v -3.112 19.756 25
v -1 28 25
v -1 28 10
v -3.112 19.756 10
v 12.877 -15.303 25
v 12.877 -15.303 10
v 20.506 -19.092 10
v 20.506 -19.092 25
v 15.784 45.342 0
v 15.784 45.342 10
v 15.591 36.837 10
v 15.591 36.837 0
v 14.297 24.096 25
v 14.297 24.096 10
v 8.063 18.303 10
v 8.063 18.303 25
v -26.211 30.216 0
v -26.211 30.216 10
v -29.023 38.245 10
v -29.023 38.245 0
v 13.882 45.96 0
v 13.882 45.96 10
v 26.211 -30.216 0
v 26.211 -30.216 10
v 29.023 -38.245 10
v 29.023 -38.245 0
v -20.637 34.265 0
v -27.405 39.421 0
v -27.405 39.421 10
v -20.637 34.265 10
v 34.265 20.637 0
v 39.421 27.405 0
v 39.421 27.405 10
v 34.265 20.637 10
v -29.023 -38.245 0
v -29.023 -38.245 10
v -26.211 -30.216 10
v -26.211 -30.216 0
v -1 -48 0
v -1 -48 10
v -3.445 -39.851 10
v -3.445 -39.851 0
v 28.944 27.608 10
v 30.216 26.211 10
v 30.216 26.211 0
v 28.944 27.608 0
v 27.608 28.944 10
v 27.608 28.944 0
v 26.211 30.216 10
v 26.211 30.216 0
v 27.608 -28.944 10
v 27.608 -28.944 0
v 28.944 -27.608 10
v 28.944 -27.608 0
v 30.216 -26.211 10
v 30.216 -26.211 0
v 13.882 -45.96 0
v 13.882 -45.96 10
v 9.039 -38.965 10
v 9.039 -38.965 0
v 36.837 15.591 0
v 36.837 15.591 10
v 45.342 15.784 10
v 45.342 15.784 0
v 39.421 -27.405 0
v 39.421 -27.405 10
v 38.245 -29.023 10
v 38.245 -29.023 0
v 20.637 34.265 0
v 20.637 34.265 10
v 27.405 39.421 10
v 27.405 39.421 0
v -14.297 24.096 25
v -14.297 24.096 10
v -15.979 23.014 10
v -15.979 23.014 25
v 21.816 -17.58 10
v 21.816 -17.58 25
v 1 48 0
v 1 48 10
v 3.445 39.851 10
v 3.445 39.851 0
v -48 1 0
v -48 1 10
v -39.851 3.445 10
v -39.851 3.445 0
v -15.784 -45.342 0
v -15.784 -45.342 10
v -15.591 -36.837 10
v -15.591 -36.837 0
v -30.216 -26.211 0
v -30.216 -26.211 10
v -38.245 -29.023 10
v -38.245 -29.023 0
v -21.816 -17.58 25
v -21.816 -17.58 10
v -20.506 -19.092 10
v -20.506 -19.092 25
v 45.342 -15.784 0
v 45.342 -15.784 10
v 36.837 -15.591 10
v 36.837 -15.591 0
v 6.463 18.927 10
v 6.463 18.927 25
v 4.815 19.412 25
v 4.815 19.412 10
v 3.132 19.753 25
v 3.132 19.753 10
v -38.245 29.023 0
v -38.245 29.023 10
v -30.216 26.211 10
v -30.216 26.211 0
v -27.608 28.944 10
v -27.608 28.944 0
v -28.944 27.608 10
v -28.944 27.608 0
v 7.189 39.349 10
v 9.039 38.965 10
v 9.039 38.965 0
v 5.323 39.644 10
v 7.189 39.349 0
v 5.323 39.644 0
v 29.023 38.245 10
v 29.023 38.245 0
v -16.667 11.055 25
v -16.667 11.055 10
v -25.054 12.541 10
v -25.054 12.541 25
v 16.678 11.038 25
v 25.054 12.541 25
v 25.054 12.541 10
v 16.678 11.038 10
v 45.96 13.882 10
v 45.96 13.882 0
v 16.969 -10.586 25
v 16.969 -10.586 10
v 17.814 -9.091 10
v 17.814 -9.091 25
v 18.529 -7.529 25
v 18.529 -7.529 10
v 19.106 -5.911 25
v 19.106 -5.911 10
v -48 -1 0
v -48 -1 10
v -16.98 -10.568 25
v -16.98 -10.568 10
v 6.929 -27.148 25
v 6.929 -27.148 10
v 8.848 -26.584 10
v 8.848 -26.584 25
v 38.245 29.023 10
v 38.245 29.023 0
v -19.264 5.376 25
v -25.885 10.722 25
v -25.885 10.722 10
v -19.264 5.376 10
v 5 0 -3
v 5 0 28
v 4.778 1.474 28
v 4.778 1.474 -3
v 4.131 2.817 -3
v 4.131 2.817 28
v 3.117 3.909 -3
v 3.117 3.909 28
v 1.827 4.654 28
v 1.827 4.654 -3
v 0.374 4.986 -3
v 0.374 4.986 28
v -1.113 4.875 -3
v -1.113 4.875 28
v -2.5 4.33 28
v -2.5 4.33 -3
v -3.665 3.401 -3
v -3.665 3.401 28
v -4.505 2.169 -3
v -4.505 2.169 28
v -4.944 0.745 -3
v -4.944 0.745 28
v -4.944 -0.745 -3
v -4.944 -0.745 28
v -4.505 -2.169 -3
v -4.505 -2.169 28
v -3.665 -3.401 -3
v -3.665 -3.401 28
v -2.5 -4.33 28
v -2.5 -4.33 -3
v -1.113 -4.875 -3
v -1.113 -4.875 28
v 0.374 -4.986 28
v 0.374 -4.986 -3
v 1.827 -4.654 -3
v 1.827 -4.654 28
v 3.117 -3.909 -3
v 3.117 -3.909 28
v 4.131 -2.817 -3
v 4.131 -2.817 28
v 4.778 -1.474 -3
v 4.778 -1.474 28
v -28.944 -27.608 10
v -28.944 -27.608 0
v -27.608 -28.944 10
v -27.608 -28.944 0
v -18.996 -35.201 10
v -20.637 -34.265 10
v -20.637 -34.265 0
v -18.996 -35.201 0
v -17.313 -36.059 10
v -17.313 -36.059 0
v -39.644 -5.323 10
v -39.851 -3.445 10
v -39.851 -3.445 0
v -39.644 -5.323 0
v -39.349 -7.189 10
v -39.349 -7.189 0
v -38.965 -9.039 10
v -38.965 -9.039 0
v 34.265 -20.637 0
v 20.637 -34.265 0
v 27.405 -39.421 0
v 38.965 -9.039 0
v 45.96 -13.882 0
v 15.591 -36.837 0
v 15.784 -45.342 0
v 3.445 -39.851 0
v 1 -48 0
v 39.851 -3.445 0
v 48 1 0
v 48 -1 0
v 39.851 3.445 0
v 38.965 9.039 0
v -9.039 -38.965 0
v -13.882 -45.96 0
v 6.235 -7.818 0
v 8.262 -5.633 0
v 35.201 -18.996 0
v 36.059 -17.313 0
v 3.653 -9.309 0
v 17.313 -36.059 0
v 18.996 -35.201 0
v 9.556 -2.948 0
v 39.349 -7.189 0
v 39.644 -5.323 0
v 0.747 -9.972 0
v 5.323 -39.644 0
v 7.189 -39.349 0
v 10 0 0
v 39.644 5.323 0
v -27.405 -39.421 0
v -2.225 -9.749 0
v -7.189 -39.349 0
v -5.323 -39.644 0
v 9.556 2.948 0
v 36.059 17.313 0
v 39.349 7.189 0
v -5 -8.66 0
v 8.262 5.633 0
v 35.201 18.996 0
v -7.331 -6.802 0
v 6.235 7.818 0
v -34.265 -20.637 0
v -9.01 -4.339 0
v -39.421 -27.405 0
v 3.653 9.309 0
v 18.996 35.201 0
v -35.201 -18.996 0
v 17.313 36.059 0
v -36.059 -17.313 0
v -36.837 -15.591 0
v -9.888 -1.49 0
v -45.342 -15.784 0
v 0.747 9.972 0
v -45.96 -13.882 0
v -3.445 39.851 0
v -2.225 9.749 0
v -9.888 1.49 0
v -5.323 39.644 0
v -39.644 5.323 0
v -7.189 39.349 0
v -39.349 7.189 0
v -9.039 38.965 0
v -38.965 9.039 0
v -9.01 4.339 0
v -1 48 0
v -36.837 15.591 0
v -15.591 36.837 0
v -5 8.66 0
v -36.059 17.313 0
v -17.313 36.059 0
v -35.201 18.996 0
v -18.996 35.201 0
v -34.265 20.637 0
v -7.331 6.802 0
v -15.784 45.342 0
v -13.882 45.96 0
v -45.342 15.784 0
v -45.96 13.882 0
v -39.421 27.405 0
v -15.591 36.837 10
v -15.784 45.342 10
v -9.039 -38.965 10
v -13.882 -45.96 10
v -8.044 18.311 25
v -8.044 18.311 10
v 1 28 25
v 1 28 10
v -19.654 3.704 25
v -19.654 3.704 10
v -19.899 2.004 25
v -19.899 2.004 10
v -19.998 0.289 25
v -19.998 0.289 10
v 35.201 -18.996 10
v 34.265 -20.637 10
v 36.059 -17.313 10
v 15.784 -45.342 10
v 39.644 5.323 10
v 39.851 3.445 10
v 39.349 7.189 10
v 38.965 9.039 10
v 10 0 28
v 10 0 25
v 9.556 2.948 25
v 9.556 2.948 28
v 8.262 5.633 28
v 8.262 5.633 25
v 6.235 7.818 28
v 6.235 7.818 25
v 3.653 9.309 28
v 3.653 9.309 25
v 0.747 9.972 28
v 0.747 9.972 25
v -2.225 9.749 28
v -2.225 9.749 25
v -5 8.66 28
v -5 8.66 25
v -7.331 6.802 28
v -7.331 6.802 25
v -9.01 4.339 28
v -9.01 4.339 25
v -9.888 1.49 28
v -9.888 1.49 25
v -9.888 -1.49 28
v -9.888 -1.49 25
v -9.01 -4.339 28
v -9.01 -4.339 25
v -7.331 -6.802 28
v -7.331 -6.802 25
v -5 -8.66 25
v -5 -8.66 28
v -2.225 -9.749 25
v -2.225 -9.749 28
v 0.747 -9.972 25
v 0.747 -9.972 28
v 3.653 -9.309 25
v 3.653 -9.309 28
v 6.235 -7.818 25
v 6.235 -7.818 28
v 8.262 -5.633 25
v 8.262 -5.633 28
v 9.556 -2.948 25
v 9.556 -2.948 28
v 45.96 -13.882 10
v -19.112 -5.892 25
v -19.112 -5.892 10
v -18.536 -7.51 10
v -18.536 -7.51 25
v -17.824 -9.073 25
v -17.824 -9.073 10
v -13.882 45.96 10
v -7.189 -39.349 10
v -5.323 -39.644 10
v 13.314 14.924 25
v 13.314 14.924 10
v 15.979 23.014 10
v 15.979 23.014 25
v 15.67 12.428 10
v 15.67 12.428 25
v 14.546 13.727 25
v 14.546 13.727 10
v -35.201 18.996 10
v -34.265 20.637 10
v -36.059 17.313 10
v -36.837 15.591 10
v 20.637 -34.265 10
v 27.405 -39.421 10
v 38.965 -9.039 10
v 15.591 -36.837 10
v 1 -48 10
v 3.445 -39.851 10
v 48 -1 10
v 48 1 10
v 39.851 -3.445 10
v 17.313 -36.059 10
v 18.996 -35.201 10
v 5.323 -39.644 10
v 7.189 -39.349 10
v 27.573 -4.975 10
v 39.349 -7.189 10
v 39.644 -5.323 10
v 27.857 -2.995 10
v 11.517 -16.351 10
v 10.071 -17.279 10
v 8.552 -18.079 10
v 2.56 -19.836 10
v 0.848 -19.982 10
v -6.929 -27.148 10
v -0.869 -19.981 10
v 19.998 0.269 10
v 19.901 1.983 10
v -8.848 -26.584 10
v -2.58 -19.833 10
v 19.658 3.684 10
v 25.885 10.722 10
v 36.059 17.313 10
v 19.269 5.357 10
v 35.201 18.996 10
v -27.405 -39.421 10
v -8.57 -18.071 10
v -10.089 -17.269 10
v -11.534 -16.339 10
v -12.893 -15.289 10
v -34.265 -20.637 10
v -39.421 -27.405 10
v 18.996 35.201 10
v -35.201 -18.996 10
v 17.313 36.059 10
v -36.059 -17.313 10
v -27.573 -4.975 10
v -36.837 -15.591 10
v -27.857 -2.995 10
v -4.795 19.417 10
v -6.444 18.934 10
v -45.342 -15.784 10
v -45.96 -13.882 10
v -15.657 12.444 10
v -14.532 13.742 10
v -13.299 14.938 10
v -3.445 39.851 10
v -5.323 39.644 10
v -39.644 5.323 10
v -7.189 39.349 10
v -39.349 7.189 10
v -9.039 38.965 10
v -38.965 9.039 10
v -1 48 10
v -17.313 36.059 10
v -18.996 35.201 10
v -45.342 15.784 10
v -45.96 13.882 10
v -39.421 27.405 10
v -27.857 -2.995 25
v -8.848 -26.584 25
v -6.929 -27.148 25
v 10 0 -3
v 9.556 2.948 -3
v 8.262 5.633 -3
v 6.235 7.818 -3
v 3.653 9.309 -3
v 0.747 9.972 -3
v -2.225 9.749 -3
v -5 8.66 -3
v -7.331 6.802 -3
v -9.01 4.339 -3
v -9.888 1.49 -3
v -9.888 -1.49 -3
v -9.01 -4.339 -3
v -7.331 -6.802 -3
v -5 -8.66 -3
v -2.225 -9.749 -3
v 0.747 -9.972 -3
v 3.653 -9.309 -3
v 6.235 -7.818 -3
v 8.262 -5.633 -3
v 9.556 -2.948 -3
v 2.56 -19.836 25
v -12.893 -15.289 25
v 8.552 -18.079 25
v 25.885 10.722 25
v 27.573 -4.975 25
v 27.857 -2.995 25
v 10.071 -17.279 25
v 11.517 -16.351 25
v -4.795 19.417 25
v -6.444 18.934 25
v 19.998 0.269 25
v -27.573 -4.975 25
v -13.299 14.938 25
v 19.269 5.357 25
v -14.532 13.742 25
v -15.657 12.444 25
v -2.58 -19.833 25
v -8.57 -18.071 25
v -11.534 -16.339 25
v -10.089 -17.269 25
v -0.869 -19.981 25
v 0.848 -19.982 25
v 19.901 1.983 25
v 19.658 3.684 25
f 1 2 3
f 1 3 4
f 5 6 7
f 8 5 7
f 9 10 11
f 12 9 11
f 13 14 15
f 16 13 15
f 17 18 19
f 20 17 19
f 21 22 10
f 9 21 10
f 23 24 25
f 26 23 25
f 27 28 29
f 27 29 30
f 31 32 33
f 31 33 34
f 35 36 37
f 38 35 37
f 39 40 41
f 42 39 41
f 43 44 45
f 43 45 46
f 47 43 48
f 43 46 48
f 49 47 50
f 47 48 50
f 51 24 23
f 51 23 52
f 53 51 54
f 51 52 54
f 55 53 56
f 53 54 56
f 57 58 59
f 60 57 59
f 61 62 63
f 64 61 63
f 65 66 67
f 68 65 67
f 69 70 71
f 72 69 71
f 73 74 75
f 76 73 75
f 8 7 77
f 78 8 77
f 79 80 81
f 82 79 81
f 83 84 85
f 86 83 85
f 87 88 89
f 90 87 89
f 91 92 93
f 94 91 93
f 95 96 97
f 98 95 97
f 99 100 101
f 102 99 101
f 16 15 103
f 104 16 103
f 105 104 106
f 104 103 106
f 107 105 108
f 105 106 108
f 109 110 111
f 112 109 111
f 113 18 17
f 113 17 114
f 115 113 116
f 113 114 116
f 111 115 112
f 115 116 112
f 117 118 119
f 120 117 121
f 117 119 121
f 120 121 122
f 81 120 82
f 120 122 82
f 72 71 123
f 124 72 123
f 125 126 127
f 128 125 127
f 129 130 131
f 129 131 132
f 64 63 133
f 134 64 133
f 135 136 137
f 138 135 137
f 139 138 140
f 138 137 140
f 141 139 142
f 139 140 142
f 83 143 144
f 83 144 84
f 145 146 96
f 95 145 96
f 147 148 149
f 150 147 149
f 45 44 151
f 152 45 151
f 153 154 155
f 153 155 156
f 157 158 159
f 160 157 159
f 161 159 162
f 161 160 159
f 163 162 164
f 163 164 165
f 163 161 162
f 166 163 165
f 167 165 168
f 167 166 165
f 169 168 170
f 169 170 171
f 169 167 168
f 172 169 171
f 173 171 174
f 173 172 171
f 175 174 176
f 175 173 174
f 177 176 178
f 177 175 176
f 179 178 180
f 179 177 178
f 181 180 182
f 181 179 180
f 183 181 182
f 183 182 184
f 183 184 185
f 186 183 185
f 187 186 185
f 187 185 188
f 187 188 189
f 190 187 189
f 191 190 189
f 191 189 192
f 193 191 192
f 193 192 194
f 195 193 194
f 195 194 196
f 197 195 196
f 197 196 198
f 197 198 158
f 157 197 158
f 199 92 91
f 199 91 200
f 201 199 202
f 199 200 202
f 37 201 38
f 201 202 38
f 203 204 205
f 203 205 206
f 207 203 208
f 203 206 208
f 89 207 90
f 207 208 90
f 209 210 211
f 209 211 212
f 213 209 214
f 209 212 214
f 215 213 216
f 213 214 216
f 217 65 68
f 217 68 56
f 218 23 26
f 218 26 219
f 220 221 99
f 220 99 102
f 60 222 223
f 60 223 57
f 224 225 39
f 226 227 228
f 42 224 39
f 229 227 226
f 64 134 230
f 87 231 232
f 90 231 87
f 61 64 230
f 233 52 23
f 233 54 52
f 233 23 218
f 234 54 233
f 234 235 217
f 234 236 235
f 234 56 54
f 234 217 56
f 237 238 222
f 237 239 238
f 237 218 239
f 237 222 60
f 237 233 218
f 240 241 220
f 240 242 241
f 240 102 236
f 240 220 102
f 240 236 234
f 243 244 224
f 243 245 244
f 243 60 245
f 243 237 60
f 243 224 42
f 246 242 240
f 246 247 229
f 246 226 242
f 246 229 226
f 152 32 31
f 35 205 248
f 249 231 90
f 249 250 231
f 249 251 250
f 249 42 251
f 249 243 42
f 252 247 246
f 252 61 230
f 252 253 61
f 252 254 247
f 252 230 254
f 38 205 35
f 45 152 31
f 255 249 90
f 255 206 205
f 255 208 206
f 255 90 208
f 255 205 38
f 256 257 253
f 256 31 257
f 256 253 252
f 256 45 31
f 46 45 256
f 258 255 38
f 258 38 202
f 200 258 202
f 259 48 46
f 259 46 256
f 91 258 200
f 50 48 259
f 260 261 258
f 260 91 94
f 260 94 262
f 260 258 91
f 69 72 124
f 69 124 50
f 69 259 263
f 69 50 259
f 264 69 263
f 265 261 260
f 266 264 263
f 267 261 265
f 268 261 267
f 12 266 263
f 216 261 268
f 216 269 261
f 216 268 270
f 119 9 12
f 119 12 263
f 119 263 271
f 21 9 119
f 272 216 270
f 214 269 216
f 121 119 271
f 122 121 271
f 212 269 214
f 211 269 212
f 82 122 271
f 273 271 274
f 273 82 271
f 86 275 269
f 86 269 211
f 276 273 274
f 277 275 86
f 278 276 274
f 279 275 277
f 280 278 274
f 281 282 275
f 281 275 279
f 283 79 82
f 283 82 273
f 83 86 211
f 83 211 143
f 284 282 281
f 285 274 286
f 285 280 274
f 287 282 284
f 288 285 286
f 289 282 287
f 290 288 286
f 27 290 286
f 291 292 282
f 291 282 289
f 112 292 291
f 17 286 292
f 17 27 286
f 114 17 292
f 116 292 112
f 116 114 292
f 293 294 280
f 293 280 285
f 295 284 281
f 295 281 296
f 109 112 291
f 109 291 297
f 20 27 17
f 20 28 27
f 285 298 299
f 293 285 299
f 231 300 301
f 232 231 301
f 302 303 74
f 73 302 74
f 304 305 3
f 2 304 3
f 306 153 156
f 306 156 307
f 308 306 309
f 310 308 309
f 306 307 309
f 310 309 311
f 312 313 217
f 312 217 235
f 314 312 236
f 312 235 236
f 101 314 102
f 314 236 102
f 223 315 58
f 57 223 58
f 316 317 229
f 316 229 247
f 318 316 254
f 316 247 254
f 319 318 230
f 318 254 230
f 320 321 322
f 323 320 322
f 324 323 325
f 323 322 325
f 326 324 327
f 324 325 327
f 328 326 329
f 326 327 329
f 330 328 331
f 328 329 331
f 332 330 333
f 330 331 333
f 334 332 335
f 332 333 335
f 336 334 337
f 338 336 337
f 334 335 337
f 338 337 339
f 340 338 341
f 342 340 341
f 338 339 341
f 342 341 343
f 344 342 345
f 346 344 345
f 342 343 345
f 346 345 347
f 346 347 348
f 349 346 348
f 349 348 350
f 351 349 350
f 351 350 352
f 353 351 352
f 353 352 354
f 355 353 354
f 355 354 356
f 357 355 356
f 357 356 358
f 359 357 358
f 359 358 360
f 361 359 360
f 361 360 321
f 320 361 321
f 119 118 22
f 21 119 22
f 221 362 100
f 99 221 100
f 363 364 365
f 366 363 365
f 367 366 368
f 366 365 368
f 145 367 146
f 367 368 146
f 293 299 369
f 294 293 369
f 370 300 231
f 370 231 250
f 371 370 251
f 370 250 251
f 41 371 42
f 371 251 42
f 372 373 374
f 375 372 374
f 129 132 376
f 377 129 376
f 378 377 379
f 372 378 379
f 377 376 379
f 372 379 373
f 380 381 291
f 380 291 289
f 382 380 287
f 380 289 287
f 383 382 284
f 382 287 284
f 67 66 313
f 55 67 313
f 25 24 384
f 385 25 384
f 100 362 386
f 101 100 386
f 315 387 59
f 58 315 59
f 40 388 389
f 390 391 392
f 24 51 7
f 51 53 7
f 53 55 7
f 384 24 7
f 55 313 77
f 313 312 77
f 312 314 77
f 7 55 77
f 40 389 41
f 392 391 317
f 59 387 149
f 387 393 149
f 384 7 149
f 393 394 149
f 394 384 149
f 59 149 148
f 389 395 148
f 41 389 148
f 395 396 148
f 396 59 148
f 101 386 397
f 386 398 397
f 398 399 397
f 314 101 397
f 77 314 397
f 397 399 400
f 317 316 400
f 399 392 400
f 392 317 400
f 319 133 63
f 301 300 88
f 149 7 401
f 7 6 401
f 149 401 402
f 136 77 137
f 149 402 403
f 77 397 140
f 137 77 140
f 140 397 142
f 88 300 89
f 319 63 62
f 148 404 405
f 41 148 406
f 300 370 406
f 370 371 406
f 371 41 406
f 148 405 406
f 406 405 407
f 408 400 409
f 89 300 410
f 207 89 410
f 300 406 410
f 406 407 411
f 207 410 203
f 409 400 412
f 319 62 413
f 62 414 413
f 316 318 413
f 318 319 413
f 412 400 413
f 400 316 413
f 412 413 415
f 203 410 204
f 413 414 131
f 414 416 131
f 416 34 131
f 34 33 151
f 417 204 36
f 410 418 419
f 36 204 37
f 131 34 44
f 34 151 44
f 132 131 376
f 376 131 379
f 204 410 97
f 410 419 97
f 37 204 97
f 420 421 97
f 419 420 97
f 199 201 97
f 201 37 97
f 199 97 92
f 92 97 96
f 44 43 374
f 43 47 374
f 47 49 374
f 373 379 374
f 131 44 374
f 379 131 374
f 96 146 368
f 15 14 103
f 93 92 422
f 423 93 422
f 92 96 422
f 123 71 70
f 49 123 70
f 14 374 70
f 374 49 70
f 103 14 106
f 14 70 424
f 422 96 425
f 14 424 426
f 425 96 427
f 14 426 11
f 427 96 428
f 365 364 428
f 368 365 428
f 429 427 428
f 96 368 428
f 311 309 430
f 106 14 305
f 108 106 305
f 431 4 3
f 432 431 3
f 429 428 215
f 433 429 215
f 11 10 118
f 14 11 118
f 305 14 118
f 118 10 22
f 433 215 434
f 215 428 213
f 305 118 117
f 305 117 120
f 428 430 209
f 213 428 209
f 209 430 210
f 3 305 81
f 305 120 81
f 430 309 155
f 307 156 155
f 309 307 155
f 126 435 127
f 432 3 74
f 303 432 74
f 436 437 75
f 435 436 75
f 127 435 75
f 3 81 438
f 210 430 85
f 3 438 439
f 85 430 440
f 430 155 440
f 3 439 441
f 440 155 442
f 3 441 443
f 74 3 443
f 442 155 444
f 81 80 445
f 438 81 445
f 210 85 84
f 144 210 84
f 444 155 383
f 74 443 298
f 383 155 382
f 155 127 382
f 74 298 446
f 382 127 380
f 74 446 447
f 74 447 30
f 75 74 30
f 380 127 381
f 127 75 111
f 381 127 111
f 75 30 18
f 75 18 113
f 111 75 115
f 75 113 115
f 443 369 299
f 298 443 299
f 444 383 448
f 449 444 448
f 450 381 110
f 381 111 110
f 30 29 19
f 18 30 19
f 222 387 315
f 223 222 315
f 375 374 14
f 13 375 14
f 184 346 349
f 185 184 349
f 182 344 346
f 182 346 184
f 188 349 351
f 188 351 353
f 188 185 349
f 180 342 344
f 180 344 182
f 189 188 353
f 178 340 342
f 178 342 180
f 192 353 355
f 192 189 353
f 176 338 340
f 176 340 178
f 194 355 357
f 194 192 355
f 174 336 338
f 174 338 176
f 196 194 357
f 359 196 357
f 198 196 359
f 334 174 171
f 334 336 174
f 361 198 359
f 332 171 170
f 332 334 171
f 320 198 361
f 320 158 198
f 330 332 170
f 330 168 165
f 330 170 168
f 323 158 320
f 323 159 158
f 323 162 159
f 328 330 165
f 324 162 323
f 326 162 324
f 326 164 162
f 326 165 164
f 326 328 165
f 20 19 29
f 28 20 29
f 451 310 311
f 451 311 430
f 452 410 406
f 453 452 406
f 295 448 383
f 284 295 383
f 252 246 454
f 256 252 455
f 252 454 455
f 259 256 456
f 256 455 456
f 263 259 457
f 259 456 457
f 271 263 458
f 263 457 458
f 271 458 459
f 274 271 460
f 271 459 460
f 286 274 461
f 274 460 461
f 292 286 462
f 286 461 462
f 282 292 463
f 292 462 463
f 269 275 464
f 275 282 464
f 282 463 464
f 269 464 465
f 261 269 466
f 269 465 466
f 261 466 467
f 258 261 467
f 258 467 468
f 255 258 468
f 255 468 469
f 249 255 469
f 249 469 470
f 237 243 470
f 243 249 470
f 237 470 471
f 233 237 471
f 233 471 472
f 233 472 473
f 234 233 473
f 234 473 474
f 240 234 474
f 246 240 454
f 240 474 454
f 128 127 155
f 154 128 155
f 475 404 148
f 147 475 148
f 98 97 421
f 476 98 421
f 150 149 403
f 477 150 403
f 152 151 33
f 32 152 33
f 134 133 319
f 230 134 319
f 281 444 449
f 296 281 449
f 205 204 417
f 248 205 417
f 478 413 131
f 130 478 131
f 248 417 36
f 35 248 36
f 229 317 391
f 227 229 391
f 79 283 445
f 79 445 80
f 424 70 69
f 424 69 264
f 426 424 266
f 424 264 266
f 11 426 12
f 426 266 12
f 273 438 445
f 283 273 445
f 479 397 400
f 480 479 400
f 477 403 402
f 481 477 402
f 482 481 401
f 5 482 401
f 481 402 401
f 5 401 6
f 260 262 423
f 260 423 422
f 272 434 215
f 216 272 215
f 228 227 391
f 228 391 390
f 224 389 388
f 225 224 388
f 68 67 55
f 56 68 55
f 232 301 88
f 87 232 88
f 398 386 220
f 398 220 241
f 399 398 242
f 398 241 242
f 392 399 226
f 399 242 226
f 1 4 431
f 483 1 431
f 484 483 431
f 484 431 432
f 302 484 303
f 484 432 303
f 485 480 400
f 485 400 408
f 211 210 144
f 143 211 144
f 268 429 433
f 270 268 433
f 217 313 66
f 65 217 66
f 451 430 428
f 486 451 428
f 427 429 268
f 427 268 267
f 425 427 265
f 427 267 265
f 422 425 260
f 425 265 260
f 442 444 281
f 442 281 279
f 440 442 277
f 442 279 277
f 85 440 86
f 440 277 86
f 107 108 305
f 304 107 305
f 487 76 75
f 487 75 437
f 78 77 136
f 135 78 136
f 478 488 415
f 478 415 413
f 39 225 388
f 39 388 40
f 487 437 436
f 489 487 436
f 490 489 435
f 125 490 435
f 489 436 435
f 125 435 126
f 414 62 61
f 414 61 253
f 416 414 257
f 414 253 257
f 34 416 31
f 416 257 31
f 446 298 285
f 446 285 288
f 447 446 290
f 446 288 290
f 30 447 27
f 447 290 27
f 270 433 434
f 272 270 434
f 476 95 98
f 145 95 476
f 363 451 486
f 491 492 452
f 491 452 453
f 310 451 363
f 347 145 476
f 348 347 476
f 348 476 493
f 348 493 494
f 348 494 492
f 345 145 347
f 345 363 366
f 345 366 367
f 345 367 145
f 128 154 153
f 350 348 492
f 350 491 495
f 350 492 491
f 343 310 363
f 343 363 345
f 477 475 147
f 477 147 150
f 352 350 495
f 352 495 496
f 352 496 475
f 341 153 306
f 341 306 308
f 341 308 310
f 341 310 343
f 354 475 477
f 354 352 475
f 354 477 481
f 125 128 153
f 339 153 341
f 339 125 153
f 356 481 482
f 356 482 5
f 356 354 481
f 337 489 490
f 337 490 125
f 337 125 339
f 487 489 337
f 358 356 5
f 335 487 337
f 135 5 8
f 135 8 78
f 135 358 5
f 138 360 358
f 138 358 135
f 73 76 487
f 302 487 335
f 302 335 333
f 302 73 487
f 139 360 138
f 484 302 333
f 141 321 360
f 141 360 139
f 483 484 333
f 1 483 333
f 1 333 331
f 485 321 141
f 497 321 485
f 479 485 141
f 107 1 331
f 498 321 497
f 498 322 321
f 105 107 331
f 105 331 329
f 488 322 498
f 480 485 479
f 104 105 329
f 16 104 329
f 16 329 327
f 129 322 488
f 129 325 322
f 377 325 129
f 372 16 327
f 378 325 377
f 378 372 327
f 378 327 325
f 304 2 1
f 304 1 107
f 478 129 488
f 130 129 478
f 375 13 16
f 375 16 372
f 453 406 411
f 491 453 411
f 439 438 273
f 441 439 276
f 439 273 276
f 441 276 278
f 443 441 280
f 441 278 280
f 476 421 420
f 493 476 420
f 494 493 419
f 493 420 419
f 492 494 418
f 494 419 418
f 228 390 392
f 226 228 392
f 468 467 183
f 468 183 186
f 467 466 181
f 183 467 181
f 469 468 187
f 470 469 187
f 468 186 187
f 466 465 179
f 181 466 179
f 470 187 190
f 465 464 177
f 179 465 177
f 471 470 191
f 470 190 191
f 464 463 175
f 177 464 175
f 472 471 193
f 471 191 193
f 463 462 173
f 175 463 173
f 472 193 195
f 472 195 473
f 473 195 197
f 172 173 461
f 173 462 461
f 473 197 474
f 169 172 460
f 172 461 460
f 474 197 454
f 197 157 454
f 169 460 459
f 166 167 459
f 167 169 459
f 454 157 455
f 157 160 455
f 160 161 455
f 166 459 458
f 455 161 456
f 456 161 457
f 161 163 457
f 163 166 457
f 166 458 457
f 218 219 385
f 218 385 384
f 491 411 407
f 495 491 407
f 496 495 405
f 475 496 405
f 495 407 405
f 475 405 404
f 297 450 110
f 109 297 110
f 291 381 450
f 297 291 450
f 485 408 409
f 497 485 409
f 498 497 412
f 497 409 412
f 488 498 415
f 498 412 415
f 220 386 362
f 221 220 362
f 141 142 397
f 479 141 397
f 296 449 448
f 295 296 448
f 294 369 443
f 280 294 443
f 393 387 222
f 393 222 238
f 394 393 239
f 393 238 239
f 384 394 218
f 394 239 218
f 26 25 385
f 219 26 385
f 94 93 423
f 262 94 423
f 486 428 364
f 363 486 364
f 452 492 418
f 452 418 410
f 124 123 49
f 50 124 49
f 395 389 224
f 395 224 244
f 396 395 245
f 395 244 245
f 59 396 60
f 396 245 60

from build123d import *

# Parameters (mm, degrees)
SKETCH1_R                = 40
BOSS_EXTRUDE1_DEPTH      = 10
BOSS_EXTRUDE2_DEPTH      = 10
SKETCH3_R                = 20
BOSS_EXTRUDE3_DEPTH      = 15
BOSS_EXTRUDE4_START      = -15
BOSS_EXTRUDE4_DEPTH      = 15
BOSS_EXTRUDE6_DEPTH      = 3
BOSS_EXTRUDE6_DEPTH_BACK = 28
SKETCH5_R                = 10
SKETCH5_R_2              = 5
CUT_EXTRUDE1_DEPTH       = 74.430239003
CUT_EXTRUDE1_DEPTH_BACK  = 74.430239003
SKETCH6_R                = 5


with BuildPart() as part:
    # Sketch1 → Boss-Extrude1 (new body)
    with BuildSketch(Plane.XY):
        Circle(SKETCH1_R)
    extrude(amount=BOSS_EXTRUDE1_DEPTH)

    # Sketch2 → Boss-Extrude2 (add)
    with BuildSketch(Plane.XY.offset(10)):
        Polygon((-1, 48), (1, 48), (4, 38), (-4, 38), align=None)
        Polygon((7.938419721, 37.376215597), (13.881759214, 45.959729777), (15.783872246, 45.341695788), (15.546871851, 34.904079642), align=None)
        Polygon((19.09977161, 33.093786795), (27.404675116, 39.420600982), (29.022709104, 38.245030478), (25.571907565, 28.391504777), align=None)
        Polygon((28.391504777, 25.571907565), (38.245030478, 29.022709104), (39.420600982, 27.404675116), (33.093786795, 19.09977161), align=None)
        Polygon((34.904079642, 15.546871851), (45.341695788, 15.783872246), (45.959729777, 13.881759214), (37.376215597, 7.938419721), align=None)
        Polygon((38, 4), (48, 1), (48, -1), (38, -4), align=None)
        Polygon((37.376215597, -7.938419721), (45.959729777, -13.881759214), (45.341695788, -15.783872246), (34.904079642, -15.546871851), align=None)
        Polygon((33.093786795, -19.09977161), (39.420600982, -27.404675116), (38.245030478, -29.022709104), (28.391504777, -25.571907565), align=None)
        Polygon((25.571907565, -28.391504777), (29.022709104, -38.245030478), (27.404675116, -39.420600982), (19.09977161, -33.093786795), align=None)
        Polygon((15.546871851, -34.904079642), (15.783872246, -45.341695788), (13.881759214, -45.959729777), (7.938419721, -37.376215597), align=None)
        Polygon((4, -38), (1, -48), (-1, -48), (-4, -38), align=None)
        Polygon((-7.938419721, -37.376215597), (-13.881759214, -45.959729777), (-15.783872246, -45.341695788), (-15.546871851, -34.904079642), align=None)
        Polygon((-19.09977161, -33.093786795), (-27.404675116, -39.420600982), (-29.022709104, -38.245030478), (-25.571907565, -28.391504777), align=None)
        Polygon((-28.391504777, -25.571907565), (-38.245030478, -29.022709104), (-39.420600982, -27.404675116), (-33.093786795, -19.09977161), align=None)
        Polygon((-34.904079642, -15.546871851), (-45.341695788, -15.783872246), (-45.959729777, -13.881759214), (-37.376215597, -7.938419721), align=None)
        Polygon((-38, -4), (-48, -1), (-48, 1), (-38, 4), align=None)
        Polygon((-37.376215597, 7.938419721), (-45.959729777, 13.881759214), (-45.341695788, 15.783872246), (-34.904079642, 15.546871851), align=None)
        Polygon((-33.093786795, 19.09977161), (-39.420600982, 27.404675116), (-38.245030478, 29.022709104), (-28.391504777, 25.571907565), align=None)
        Polygon((-25.571907565, 28.391504777), (-29.022709104, 38.245030478), (-27.404675116, 39.420600982), (-19.09977161, 33.093786795), align=None)
        Polygon((-15.546871851, 34.904079642), (-15.783872246, 45.341695788), (-13.881759214, 45.959729777), (-7.938419721, 37.376215597), align=None)
    extrude(amount=-BOSS_EXTRUDE2_DEPTH)

    # Sketch3 → Boss-Extrude3 (add)
    with BuildSketch(Plane.XY.offset(10)):
        Circle(SKETCH3_R)
    extrude(amount=BOSS_EXTRUDE3_DEPTH)

    # Sketch4 → Boss-Extrude4 (add)
    with BuildSketch(Plane.XY.offset(25).offset(BOSS_EXTRUDE4_START)):
        with BuildLine():
            ThreePointArc((-13.298978315, 14.937776802), (-10.804143602, 16.830641136), (-8.044414634, 18.310854518))
            Line((-8.044414634, 18.310854518), (-14.296689356, 24.095739737))
            Line((-14.296689356, 24.095739737), (-15.979196422, 23.014458102))
            Line((-15.979196422, 23.014458102), (-13.298978315, 14.937776802))
        make_face()
        with BuildLine():
            Line((1, 28), (-1, 28))
            Line((-1, 28), (-3.11184063, 19.756428015))
            ThreePointArc((-3.11184063, 19.756428015), (-1.560679292, 19.939014021), (0, 20))
            ThreePointArc((0, 20), (1.570955262, 19.93820703), (3.132203125, 19.753209957))
            Line((3.132203125, 19.753209957), (1, 28))
        make_face()
        with BuildLine():
            Line((14.296689356, 24.095739737), (8.063284469, 18.302552925))
            ThreePointArc((8.063284469, 18.302552925), (10.821486224, 16.819495709), (13.314368522, 14.924060803))
            Line((13.314368522, 14.924060803), (15.979196422, 23.014458102))
            Line((15.979196422, 23.014458102), (14.296689356, 24.095739737))
        make_face()
        with BuildLine():
            Line((25.054280857, 12.541252359), (16.67837372, 11.037746602))
            ThreePointArc((16.67837372, 11.037746602), (18.196919426, 8.298923027), (19.269315989, 5.356627793))
            Line((19.269315989, 5.356627793), (25.885110883, 10.721988369))
            Line((25.885110883, 10.721988369), (25.054280857, 12.541252359))
        make_face()
        with BuildLine():
            Line((27.857315211, -2.99499403), (19.99819716, 0.268533721))
            ThreePointArc((19.99819716, 0.268533721), (19.999549285, 0.134269886), (20, 0))
            ThreePointArc((20, 0), (19.775336098, -2.989328052), (19.10639178, -5.911496693))
            Line((19.10639178, -5.911496693), (27.572685534, -4.974636914))
            Line((27.572685534, -4.974636914), (27.857315211, -2.99499403))
        make_face()
        with BuildLine():
            ThreePointArc((-19.263784352, 5.376486999), (-18.188355556, 8.317675286), (-16.666987586, 11.054932149))
            Line((-16.666987586, 11.054932149), (-25.054280857, 12.541252359))
            Line((-25.054280857, 12.541252359), (-25.885110883, 10.721988369))
            Line((-25.885110883, 10.721988369), (-19.263784352, 5.376486999))
        make_face()
        with BuildLine():
            ThreePointArc((-19.112474968, -5.891799437), (-19.797893134, -2.836093696), (-19.997909742, 0.289146933))
            Line((-19.997909742, 0.289146933), (-27.857315211, -2.99499403))
            Line((-27.857315211, -2.99499403), (-27.572685534, -4.974636914))
            Line((-27.572685534, -4.974636914), (-19.112474968, -5.891799437))
        make_face()
        with BuildLine():
            ThreePointArc((-12.893089824, -15.289481181), (-15.121739527, -13.089422969), (-16.979636854, -10.568440392))
            Line((-16.979636854, -10.568440392), (-21.815848816, -17.580350976))
            Line((-21.815848816, -17.580350976), (-20.506127348, -19.091850125))
            Line((-20.506127348, -19.091850125), (-12.893089824, -15.289481181))
        make_face()
        with BuildLine():
            ThreePointArc((-2.580239759, -19.832860681), (-5.644540466, -19.186952935), (-8.570449237, -18.070622565))
            Line((-8.570449237, -18.070622565), (-8.848004565, -26.584070704))
            Line((-8.848004565, -26.584070704), (-6.929018618, -27.147535818))
            Line((-6.929018618, -27.147535818), (-2.580239759, -19.832860681))
        make_face()
        with BuildLine():
            Line((8.848004565, -26.584070704), (8.551818198, -18.079447047))
            ThreePointArc((8.551818198, -18.079447047), (5.624760311, -19.192760912), (2.559795457, -19.835509754))
            Line((2.559795457, -19.835509754), (6.929018618, -27.147535818))
            Line((6.929018618, -27.147535818), (8.848004565, -26.584070704))
        make_face()
        with BuildLine():
            Line((21.815848816, -17.580350976), (16.968734301, -10.585936718))
            ThreePointArc((16.968734301, -10.585936718), (15.108239432, -13.10500291), (12.87732318, -15.302762748))
            Line((12.87732318, -15.302762748), (20.506127348, -19.091850125))
            Line((20.506127348, -19.091850125), (21.815848816, -17.580350976))
        make_face()
    extrude(amount=BOSS_EXTRUDE4_DEPTH)

    # Sketch5 → Boss-Extrude6 (add, two sides: drawn at the far end of the back side and taken through both)
    with BuildSketch(Plane.XY.offset(25).offset(-BOSS_EXTRUDE6_DEPTH_BACK)):
        Circle(SKETCH5_R)
        Circle(SKETCH5_R_2, mode=Mode.SUBTRACT)
    extrude(amount=BOSS_EXTRUDE6_DEPTH + BOSS_EXTRUDE6_DEPTH_BACK)

    # Sketch6 → Cut-Extrude1 (cut, two sides: drawn at the far end of the back side and taken through both)
    with BuildSketch(Plane.XY.offset(25).offset(-CUT_EXTRUDE1_DEPTH_BACK)):
        Circle(SKETCH6_R)
    extrude(amount=CUT_EXTRUDE1_DEPTH + CUT_EXTRUDE1_DEPTH_BACK, mode=Mode.SUBTRACT)


solid = part.part
